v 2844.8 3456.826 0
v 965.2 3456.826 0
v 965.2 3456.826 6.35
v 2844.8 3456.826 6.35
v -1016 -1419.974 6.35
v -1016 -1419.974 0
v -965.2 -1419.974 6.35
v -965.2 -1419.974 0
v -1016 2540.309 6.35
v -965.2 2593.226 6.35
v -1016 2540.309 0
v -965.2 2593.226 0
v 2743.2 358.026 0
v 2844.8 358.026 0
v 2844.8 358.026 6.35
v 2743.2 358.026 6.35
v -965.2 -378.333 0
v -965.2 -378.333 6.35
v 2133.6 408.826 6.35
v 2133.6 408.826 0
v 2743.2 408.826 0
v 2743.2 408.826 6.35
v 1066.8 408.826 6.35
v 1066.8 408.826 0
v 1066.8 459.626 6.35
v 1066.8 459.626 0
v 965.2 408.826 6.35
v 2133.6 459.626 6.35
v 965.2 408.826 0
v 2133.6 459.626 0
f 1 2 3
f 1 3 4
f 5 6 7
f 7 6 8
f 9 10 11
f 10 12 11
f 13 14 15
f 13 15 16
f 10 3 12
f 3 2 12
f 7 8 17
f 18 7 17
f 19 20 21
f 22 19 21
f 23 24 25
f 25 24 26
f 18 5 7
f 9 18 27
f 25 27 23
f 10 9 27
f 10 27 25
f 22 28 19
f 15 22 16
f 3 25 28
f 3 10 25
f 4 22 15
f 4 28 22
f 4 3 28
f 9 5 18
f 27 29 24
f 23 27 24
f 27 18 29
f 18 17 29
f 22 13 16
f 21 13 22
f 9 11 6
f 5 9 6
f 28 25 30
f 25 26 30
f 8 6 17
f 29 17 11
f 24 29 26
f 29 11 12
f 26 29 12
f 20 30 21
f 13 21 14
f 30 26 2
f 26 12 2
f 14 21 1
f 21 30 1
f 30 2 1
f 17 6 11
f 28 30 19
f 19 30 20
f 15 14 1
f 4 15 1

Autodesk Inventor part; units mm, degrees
ref_plane "YZ Plane" through (0, 0, 0) normal (1, 0, 0) x (0, 1, 0)
ref_plane "XZ Plane" through (0, 0, 0) normal (0, 1, 0) x (-1, 0, 0)
ref_plane "XY Plane" through (0, 0, 0) normal (0, 0, 1) x (1, 0, 0)
ref_plane "Work Plane1" through (0, 81.2927, 0) normal (0, 0, 1) x (1, 0, 0)
sketch "Sketch1" plane through (0, 81.2927, 0) normal (0, 0, 1) x (1, 0, 0)
  line L0 (-965.2, -459.6259) -> (965.2, 403.9741) projected
  line L1 (-965.2, -1501.2668) -> (-965.2, 835.5332) projected
  line L2 (-965.2, 835.5332) -> (-1016, 835.5332) projected
  line L3 (-1016, 835.5332) -> (-1016, -1501.2668) projected
  line L4 (-1016, -1501.2668) -> (-965.2, -1501.2668) projected
  line L5 (-965.2, 2511.9332) -> (-1016, 2459.0165) projected
  line L6 (-1016, 2459.0165) -> (-1016, 835.5332) projected
  line L7 (-1016, 835.5332) -> (-965.2, 835.5332) projected
  line L8 (-965.2, 835.5332) -> (-965.2, 2511.9332) projected
  line L9 (965.2, 3319.8814) -> (965.2, 3375.5332) projected
  line L10 (965.2, 3375.5332) -> (-965.2, 2511.9332) projected
  line L11 (-965.2, 2511.9332) -> (-965.2, 2456.2814) projected
  line L12 (-965.2, 2456.2814) -> (965.2, 3319.8814) projected
  line L13 (965.2, 327.5332) -> (1016, 327.5332) projected
  line L14 (1016, 327.5332) -> (1016, 3375.5332) projected
  line L15 (965.2, 3375.5332) -> (1016, 3375.5332) projected
  line L16 (965.2, 327.5332) -> (965.2, 3375.5332) projected
  line L17 (1016, 327.5332) -> (1066.8, 327.5332) projected
  line L18 (1066.8, 327.5332) -> (1066.8, 3375.5332) projected
  line L19 (1016, 3375.5332) -> (1066.8, 3375.5332) projected
  line L20 (1016, 327.5332) -> (1016, 3375.5332) projected
  line L21 (1066.8, 3375.5332) -> (1066.8, 3273.9332) projected
  line L22 (1066.8, 3273.9332) -> (2743.2, 3273.9332) projected
  line L23 (2743.2, 3375.5332) -> (2743.2, 3273.9332) projected
  line L24 (1066.8, 3375.5332) -> (2743.2, 3375.5332) projected
  line L25 (2844.8, 3273.9332) -> (2743.2, 3273.9332) projected
  line L26 (2743.2, 3273.9332) -> (2743.2, 1876.9332) projected
  line L27 (2844.8, 1876.9332) -> (2743.2, 1876.9332) projected
  line L28 (2844.8, 3273.9332) -> (2844.8, 1876.9332) projected
  line L29 (2836.6524, 1775.3332) -> (2735.0524, 1775.3332) projected
  line L30 (2735.0524, 1775.3332) -> (2735.0524, 378.3332) projected
  line L31 (2836.6524, 378.3332) -> (2735.0524, 378.3332) projected
  line L32 (2836.6524, 1775.3332) -> (2836.6524, 378.3332) projected
  line L33 (2844.8, 276.7332) -> (2743.2, 276.7332) projected
  line L34 (2743.2, 276.7332) -> (2743.2, -1399.6668) projected
  line L35 (2844.8, -1399.6668) -> (2743.2, -1399.6668) projected
  line L36 (2844.8, 276.7332) -> (2844.8, -1399.6668) projected
  line L37 (2743.2, -1399.6668) -> (2844.8, -1399.6668) projected
  line L38 (2743.2, -1501.2668) -> (2743.2, -1399.6668) projected
  line L39 (2844.8, -1501.2668) -> (2743.2, -1501.2668) projected
  line L40 (2844.8, -1399.6668) -> (2844.8, -1501.2668) projected
  line L41 (1066.8, -1399.6668) -> (1066.8, -1501.2668) projected
  line L42 (1066.8, -1501.2668) -> (2743.2, -1501.2668) projected
  line L43 (2743.2, -1399.6668) -> (2743.2, -1501.2668) projected
  line L44 (1066.8, -1399.6668) -> (2743.2, -1399.6668) projected
  line L45 (965.2, -1399.6668) -> (-965.2, -1399.6668) projected
  line L46 (-965.2, -1399.6668) -> (-965.2, -1501.2668) projected
  line L47 (-965.2, -1501.2668) -> (965.2, -1501.2668) projected
  line L48 (965.2, -1501.2668) -> (965.2, -1399.6668) projected
  line L49 (-1016, -1501.2668) -> (-1016, 2459.0165)
  line L50 (-965.2, 2511.9332) -> (-1016, 2459.0165)
  line L51 (-965.2, 2511.9332) -> (965.2, 3375.5332)
  line L52 (2743.2, 276.7332) -> (2844.8, 276.7332) projected
  line L53 (2844.8, 276.7332) -> (2844.8, 1191.1332) projected
  line L54 (2743.2, 1191.1332) -> (2844.8, 1191.1332) projected
  line L55 (2743.2, 276.7332) -> (2743.2, 1191.1332) projected
  line L56 (2133.6, 378.3332) -> (2133.6, 276.7332) projected
  line L57 (2133.6, 276.7332) -> (2743.2, 276.7332) projected
  line L58 (2743.2, 378.3332) -> (2743.2, 276.7332) projected
  line L59 (2133.6, 378.3332) -> (2743.2, 378.3332) projected
  line L60 (1066.8, 378.3332) -> (1066.8, 276.7332) projected
  line L61 (1066.8, 276.7332) -> (2743.2, 276.7332) projected
  line L62 (2743.2, 378.3332) -> (2743.2, 276.7332) projected
  line L63 (1066.8, 378.3332) -> (2743.2, 378.3332) projected
  line L64 (-965.2, -459.6259) -> (-1016, -459.6259)
  line L65 (-965.2, -459.6259) -> (965.2, 327.5332)
  line L66 (965.2, 327.5332) -> (2844.8, 327.5332)
  line L67 (2844.8, 327.5332) -> (2844.8, 3375.5332)
  line L68 (2844.8, 3375.5332) -> (965.2, 3375.5332)
  line L69 (965.2, 3375.5332) -> (-965.2, 2511.9332)
  line L70 (-965.2, 2511.9332) -> (-1016, 2459.0165)
  line L71 (-1016, 2459.0165) -> (-1016, -459.6259)
  line L72 (965.2, 327.5332) -> (1016, 327.5332) projected
  line L73 (1016, 327.5332) -> (1016, 3375.5332) projected
  line L74 (965.2, 3375.5332) -> (1016, 3375.5332) projected
  line L75 (965.2, 327.5332) -> (965.2, 3375.5332) projected
  line L76 (1016, 327.5332) -> (1066.8, 327.5332) projected
  line L77 (1066.8, 327.5332) -> (1066.8, 3375.5332) projected
  line L78 (1016, 3375.5332) -> (1066.8, 3375.5332) projected
  line L79 (1016, 327.5332) -> (1016, 3375.5332) projected
  point P0 (0, -81.2927)
  point P1 (1066.8, 459.6259)
  point P2 (2735.0524, 378.3332)
  point P3 (2836.6524, 1191.1332)
  point P4 (2844.8, 1191.1332)
  point P5 (2844.8, 1876.9332)
  point P6 (-965.2, -459.6259)
  point P7 (965.2, 3401.1741)
  point P8 (2743.2, 378.3332)
  point P9 (2743.2, 327.5332)
  point P10 (2133.6, 327.5332)
extrude "Extrusion1" add sketch "Sketch1" along normal blind 6.35 contours L1 L8 L12 L16 L0 | L64 L3 L2 L1 | L1 L4 L3 L64 | L0 L16 L65 | L16 L9 L15 L14 L13 | L2 L6 L5 L8 | L12 L8 L10 L9 | L14 L19 L18 L17 | L24 L23 L22 L18 | L18 L22 L26 L27 L67 L54 L32 L29 L30 L59 L63 | L56 L59 L31 L55 L66 | L68 L67 L25 L23 | L66 L53 L33 L55 | L55 L31 L32 L54 L53 L66 | L25 L28 L27 L26 | L30 L29 L32 L54 L55 L31 | L55 L54 L32 L31
properties part number "wrapping paper"
